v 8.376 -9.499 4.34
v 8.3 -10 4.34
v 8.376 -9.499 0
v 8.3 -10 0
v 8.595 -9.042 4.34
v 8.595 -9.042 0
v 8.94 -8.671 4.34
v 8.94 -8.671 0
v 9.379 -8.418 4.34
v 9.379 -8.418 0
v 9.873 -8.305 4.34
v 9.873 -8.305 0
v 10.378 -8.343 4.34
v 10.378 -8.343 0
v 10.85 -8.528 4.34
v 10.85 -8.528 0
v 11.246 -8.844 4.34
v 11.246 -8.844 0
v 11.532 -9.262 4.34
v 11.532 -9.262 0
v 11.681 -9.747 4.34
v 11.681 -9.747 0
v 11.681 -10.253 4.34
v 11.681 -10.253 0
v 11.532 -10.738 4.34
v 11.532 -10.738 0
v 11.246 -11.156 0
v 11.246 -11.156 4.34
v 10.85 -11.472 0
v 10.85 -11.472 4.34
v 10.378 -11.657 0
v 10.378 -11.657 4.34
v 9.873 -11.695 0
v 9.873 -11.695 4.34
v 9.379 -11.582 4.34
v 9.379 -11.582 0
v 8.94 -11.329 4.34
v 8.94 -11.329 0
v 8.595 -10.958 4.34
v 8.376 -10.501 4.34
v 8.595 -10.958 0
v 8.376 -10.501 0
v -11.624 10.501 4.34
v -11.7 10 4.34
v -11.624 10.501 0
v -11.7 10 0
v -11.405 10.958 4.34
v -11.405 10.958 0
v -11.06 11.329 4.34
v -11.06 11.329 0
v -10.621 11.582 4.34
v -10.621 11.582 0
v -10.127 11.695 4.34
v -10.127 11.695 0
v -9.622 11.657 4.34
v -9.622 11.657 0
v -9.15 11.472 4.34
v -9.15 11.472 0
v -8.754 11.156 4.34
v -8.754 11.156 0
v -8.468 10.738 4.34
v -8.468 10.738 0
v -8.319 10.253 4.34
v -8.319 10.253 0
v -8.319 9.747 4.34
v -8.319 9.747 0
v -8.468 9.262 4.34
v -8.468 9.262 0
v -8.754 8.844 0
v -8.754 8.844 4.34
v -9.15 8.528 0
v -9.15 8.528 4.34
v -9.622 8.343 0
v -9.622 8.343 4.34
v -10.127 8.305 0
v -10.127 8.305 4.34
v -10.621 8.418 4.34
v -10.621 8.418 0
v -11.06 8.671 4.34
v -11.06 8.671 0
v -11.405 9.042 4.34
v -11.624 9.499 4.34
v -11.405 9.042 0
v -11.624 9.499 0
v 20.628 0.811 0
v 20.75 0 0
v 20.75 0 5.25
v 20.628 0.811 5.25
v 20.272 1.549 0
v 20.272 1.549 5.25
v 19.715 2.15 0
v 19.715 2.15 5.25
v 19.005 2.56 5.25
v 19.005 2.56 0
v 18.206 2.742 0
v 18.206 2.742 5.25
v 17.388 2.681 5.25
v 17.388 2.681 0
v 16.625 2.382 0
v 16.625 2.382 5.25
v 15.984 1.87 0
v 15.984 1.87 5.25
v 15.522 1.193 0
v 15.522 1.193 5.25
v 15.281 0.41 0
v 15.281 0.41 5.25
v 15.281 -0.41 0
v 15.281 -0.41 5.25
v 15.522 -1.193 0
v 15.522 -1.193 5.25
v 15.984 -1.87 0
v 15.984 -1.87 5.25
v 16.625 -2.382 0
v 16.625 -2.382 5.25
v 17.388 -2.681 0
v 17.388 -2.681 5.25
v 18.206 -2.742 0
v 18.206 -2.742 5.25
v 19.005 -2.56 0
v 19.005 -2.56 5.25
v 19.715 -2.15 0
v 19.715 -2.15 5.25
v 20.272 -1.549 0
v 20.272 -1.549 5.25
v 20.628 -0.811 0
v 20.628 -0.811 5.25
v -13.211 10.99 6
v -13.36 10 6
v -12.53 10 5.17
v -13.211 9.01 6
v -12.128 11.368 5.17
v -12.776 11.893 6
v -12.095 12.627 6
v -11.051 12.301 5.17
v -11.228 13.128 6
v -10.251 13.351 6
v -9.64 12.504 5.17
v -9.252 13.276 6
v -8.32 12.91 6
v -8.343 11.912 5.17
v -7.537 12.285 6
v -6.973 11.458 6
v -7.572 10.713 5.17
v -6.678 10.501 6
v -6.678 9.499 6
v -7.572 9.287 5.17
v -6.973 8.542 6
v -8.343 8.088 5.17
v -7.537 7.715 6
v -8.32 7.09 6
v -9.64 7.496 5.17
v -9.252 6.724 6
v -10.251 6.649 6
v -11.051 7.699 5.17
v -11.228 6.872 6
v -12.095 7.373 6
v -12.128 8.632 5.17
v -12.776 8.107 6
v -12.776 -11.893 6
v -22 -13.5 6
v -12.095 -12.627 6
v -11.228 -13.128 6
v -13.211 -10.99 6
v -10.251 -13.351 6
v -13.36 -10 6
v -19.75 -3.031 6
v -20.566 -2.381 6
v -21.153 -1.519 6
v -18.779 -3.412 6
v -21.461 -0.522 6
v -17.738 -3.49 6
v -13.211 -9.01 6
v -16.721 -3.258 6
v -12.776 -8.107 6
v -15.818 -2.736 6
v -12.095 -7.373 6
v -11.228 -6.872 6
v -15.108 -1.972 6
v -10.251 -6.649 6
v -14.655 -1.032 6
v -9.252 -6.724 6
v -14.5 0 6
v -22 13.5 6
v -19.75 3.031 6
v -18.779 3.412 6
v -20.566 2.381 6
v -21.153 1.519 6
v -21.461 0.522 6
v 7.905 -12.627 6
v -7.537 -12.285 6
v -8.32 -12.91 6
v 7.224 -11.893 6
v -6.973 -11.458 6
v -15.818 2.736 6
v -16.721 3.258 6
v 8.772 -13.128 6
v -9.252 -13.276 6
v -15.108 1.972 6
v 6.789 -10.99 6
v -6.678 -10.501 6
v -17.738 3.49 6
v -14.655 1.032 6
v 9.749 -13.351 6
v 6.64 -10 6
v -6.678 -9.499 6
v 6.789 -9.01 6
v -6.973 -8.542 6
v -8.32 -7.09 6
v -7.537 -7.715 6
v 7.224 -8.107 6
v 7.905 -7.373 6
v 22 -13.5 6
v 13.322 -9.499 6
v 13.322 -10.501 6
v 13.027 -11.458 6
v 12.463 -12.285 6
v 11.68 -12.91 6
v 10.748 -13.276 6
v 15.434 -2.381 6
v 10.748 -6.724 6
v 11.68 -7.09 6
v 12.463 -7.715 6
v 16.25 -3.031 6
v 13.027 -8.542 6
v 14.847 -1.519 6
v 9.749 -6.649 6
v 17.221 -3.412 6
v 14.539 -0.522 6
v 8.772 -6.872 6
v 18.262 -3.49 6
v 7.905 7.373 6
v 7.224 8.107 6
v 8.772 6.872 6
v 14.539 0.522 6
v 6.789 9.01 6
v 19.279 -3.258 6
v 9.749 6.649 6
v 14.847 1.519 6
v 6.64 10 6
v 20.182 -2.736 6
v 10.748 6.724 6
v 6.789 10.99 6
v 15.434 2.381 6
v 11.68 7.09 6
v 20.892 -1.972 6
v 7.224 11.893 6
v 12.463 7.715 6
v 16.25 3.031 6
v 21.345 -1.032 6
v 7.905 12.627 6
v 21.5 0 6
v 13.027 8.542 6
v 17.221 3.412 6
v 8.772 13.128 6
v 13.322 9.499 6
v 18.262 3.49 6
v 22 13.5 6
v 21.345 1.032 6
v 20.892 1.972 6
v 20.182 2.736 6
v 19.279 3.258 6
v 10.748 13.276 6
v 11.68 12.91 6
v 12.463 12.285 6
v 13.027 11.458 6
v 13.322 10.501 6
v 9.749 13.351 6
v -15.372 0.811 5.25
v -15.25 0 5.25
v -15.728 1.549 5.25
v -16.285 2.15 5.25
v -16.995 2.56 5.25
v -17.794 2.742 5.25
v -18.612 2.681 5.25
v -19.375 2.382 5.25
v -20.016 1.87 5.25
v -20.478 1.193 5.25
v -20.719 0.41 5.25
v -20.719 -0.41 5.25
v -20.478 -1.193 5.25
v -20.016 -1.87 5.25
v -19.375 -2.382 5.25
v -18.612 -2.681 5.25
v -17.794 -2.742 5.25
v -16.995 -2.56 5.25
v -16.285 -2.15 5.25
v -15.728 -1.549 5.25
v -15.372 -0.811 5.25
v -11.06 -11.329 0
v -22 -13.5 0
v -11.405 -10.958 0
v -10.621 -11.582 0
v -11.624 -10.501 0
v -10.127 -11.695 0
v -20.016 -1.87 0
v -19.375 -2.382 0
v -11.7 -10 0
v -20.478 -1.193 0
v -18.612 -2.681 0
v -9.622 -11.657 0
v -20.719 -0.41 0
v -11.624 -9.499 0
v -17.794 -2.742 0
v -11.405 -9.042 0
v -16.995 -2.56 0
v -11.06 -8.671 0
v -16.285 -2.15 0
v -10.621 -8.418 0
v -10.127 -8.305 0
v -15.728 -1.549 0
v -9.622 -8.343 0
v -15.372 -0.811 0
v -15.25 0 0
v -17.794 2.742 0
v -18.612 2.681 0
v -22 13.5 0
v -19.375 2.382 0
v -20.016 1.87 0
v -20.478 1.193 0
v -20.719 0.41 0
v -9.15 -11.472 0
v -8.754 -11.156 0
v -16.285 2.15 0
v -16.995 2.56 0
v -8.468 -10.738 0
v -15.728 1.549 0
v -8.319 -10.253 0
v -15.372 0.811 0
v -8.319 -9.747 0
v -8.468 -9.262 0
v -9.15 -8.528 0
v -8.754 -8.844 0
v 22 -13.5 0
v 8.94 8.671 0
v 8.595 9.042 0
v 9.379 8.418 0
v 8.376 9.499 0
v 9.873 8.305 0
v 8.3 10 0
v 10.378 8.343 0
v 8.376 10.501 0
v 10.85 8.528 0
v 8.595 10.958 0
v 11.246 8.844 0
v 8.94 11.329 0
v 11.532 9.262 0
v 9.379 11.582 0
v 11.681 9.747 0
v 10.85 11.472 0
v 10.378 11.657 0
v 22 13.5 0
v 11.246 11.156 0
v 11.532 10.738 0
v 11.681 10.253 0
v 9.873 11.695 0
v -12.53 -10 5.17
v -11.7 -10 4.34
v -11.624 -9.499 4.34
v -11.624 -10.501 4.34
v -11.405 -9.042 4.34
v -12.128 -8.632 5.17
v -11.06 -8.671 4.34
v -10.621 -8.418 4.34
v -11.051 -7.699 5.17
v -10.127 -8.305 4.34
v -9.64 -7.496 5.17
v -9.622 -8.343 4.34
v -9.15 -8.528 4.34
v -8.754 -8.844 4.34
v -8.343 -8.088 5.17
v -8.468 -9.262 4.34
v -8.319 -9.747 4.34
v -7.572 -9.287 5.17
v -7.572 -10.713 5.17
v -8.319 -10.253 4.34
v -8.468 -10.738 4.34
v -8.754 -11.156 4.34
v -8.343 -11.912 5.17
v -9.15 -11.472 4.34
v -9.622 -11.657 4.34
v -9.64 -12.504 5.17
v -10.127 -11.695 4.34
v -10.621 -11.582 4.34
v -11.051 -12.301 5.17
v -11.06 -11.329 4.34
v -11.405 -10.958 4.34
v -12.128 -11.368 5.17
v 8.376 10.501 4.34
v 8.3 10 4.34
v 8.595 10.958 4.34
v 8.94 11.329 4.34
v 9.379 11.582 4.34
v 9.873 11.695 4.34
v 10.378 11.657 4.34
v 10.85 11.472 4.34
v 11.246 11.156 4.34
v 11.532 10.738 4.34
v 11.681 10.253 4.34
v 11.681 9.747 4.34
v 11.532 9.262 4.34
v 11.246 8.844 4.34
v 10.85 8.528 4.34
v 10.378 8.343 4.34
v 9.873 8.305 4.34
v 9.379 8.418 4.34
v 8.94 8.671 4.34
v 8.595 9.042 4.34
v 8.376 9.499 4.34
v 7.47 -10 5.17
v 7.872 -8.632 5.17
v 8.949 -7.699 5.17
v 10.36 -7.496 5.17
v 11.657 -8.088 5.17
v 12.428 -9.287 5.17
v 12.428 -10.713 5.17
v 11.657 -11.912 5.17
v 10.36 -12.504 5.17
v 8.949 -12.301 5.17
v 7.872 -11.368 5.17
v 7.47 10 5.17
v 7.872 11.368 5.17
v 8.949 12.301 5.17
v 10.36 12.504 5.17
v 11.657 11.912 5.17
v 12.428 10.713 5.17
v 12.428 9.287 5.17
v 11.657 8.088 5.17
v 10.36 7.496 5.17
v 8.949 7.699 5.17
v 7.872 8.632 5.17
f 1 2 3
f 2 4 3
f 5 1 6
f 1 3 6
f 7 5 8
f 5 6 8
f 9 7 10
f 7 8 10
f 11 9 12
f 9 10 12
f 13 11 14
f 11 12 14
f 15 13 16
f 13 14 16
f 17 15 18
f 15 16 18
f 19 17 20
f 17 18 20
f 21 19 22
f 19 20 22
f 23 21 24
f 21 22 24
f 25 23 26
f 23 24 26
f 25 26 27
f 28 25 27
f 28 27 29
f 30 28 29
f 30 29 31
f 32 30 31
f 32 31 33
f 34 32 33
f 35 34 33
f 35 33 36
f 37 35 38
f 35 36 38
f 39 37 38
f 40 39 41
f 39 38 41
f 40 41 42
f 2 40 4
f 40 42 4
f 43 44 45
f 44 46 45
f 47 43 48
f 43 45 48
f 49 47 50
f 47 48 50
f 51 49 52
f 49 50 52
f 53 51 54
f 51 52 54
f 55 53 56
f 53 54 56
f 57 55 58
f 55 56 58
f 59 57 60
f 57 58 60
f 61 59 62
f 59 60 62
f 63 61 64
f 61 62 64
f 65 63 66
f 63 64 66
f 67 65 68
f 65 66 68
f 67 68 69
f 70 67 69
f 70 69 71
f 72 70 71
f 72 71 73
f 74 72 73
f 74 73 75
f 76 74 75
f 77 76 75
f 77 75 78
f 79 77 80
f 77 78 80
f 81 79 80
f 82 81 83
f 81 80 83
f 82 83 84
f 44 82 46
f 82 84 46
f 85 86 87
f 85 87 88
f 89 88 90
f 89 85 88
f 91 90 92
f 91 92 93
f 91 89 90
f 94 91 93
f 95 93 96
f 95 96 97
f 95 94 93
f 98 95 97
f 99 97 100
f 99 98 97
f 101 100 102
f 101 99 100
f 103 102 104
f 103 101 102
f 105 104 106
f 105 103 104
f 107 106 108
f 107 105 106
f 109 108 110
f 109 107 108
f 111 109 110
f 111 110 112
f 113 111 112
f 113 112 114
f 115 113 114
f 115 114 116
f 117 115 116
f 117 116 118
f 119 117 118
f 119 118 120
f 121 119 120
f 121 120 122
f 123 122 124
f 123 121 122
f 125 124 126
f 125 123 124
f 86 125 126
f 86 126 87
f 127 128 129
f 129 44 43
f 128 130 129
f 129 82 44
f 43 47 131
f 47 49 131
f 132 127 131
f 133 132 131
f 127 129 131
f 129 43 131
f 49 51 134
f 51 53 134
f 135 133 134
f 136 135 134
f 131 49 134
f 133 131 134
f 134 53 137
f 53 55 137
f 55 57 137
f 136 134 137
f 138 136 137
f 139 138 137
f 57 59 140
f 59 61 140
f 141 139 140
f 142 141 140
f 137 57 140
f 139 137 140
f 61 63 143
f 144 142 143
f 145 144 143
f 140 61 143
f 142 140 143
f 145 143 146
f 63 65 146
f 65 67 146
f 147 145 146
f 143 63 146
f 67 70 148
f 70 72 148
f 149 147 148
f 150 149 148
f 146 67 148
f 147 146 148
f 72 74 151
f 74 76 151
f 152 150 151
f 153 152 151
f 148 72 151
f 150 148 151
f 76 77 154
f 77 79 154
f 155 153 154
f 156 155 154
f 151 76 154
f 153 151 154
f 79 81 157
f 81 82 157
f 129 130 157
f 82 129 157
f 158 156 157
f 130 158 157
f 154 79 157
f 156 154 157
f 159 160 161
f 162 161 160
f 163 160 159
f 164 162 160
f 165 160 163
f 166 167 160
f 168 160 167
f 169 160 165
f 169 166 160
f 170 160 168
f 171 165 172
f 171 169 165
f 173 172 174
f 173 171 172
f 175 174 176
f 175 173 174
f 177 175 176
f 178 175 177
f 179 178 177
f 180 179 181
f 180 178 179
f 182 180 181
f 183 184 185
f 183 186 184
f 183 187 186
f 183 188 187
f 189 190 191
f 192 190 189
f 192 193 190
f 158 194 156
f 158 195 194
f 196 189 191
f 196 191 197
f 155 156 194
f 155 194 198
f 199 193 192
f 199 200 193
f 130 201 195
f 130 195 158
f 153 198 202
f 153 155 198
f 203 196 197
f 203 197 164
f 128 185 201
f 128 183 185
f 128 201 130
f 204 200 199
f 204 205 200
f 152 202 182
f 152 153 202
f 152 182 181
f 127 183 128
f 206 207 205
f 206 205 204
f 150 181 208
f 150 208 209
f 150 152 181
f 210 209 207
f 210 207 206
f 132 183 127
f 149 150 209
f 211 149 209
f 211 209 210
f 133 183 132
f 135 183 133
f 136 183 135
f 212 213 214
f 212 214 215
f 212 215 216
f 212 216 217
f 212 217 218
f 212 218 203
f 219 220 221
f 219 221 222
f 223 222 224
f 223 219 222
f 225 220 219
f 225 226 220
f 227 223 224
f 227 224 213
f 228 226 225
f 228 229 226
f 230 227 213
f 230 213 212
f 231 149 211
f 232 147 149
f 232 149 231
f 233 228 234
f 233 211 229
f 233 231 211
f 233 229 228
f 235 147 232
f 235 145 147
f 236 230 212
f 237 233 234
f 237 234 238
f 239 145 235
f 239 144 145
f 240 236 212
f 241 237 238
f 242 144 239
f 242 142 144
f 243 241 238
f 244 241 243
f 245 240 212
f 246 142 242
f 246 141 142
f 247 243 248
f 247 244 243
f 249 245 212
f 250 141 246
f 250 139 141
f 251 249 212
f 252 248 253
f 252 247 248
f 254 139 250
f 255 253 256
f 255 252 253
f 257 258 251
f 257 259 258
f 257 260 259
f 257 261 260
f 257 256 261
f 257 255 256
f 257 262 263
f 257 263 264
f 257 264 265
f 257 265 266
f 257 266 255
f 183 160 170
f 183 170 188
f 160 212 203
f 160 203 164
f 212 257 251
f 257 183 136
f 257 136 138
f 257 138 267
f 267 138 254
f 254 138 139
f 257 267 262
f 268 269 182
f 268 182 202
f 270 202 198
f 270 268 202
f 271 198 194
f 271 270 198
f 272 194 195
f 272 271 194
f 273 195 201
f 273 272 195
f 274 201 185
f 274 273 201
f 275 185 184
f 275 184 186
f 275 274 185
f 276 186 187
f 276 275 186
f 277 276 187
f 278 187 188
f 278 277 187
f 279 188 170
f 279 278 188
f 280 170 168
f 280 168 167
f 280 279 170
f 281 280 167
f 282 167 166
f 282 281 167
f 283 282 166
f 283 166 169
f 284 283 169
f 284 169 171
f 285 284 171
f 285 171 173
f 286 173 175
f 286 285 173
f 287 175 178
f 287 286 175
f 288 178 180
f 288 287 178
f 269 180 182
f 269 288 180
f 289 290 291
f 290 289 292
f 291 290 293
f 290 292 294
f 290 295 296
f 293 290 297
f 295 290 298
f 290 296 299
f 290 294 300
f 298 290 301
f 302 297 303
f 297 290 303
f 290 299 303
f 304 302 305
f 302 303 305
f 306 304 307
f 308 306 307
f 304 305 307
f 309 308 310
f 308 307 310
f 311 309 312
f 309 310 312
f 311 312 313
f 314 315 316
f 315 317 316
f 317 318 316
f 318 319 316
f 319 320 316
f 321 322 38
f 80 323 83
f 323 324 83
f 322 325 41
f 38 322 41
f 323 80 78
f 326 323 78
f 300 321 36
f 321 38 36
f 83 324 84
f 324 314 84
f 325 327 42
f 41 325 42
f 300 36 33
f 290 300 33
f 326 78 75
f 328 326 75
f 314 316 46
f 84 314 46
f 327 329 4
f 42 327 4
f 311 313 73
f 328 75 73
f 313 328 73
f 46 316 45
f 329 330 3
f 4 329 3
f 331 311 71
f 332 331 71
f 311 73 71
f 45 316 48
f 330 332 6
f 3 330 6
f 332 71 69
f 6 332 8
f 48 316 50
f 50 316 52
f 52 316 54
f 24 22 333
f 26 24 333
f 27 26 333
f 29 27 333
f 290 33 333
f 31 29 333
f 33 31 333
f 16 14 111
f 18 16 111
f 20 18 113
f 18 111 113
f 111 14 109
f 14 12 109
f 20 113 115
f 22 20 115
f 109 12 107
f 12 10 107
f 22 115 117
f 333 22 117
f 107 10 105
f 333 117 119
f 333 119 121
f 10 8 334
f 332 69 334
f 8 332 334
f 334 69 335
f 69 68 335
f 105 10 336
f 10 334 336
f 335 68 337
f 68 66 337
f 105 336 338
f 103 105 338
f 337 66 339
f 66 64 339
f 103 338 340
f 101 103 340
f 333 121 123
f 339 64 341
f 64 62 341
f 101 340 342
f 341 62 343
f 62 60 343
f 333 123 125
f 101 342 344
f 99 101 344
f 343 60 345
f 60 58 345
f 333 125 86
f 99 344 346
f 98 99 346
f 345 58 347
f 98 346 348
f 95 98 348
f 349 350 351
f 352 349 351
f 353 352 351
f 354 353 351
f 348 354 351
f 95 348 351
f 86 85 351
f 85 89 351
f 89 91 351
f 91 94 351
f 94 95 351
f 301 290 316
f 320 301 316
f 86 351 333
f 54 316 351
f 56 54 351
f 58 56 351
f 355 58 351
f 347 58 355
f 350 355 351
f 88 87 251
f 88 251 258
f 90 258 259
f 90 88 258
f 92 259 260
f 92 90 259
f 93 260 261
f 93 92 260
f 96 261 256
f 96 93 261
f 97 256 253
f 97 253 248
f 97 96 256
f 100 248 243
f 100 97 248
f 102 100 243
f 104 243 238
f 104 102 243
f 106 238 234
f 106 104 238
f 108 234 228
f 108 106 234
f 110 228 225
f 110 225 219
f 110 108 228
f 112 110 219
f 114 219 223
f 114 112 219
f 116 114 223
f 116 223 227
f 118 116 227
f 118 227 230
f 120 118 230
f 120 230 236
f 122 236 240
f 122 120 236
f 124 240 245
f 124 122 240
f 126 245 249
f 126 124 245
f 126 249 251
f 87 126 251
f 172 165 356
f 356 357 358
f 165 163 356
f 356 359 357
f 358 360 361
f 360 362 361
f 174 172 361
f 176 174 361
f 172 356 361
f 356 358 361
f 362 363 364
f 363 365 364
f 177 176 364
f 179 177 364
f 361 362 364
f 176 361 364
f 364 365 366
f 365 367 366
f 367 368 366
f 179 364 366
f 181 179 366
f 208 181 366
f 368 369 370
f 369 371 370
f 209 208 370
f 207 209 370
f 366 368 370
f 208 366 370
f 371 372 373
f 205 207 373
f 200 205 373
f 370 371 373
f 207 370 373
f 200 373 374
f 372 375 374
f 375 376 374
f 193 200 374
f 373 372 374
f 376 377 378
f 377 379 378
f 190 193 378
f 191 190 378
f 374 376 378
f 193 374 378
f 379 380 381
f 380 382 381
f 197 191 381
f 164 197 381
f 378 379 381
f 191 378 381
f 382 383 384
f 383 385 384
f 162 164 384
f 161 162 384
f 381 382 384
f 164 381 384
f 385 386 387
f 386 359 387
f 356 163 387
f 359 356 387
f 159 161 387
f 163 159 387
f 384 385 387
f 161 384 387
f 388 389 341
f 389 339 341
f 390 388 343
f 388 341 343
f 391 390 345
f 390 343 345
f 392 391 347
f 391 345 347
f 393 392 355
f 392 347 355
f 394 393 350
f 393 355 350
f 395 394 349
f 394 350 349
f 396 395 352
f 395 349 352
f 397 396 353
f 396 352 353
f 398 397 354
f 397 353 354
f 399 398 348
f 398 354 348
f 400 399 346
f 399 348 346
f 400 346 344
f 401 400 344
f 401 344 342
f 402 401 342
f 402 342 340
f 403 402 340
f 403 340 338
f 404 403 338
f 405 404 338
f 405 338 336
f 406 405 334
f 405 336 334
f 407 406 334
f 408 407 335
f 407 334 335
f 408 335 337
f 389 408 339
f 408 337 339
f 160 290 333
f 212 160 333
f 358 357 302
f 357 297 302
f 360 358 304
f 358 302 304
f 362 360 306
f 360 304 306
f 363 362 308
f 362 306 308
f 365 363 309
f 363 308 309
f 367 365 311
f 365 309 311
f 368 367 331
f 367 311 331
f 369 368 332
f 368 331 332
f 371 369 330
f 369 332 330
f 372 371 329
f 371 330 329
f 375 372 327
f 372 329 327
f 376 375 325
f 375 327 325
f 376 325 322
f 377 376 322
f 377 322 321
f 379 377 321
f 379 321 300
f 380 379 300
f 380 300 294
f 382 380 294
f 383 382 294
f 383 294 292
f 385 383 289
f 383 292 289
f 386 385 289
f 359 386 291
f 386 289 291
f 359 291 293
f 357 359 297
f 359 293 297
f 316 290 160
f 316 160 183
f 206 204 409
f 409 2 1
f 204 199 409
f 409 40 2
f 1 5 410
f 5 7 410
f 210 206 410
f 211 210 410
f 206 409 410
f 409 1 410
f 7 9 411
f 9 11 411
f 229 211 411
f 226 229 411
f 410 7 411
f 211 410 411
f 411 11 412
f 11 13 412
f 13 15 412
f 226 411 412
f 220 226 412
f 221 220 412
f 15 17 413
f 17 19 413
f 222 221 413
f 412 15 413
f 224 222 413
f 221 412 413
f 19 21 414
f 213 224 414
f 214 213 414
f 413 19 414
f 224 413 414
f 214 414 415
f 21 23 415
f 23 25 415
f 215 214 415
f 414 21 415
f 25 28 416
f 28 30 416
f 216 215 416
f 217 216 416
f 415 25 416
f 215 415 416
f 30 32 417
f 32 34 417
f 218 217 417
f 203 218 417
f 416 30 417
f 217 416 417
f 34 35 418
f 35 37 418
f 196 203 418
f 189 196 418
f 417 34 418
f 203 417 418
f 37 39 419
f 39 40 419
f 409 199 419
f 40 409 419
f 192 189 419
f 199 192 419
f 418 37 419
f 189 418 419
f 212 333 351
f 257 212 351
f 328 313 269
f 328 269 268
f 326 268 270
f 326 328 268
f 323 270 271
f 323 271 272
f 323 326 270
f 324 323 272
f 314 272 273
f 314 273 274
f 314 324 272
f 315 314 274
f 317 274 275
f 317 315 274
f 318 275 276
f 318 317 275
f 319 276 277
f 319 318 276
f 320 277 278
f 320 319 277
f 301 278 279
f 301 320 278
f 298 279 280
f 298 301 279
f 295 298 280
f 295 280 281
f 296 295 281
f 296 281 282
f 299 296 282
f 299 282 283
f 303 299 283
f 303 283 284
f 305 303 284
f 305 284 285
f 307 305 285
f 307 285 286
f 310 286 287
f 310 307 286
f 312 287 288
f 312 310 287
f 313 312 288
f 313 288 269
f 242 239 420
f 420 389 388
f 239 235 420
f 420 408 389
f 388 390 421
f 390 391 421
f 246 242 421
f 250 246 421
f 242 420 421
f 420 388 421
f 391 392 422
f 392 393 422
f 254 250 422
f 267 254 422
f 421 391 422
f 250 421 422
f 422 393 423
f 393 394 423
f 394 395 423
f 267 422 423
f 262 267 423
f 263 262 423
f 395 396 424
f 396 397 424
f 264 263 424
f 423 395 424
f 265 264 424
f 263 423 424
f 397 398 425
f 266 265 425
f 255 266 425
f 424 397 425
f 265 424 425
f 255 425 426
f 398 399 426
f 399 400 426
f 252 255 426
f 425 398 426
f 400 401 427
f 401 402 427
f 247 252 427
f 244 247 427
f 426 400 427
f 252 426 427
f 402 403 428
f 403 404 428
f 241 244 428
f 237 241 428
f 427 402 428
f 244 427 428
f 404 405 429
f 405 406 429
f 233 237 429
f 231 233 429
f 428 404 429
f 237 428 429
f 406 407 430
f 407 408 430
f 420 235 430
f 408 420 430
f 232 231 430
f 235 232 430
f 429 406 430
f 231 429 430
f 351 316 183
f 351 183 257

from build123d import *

# Parameters (mm, degrees)
SKETCH1_W                     = 44
SKETCH1_H                     = 27
SKETCH1_R                     = 2.75
BOSS_EXTRUDE1_DEPTH           = 6
CSK_FOR_M3_SFHCS1_D           = 3.4
CSK_FOR_M3_SFHCS1_CSINK_D     = 6.72
CSK_FOR_M3_SFHCS1_CSINK_ANGLE = 90
CHAMFER1_SIZE                 = 0.75


with BuildPart() as part:
    # Sketch1 → Boss-Extrude1 (new body)
    with BuildSketch(Plane.XY):
        Rectangle(SKETCH1_W, SKETCH1_H)
        with Locations((-18, 0)):
            Circle(SKETCH1_R, mode=Mode.SUBTRACT)
        with Locations((18, 0)):
            Circle(SKETCH1_R, mode=Mode.SUBTRACT)
    extrude(amount=BOSS_EXTRUDE1_DEPTH)

    # CSK for M3 SFHCS1 (through all)
    with Locations(Plane.XY.offset(6)):
        with Locations((-10, 10), (10, 10), (10, -10), (-10, -10)):
            CounterSinkHole(CSK_FOR_M3_SFHCS1_D / 2, CSK_FOR_M3_SFHCS1_CSINK_D / 2, counter_sink_angle=CSK_FOR_M3_SFHCS1_CSINK_ANGLE)

    # Chamfer1
    chamfer1_edges = [part.edges().sort_by_distance(p)[0] for p in [
        (-20.75, 0, 6),
        (15.25, 0, 6),
    ]]
    chamfer(chamfer1_edges, length=CHAMFER1_SIZE)


solid = part.part
